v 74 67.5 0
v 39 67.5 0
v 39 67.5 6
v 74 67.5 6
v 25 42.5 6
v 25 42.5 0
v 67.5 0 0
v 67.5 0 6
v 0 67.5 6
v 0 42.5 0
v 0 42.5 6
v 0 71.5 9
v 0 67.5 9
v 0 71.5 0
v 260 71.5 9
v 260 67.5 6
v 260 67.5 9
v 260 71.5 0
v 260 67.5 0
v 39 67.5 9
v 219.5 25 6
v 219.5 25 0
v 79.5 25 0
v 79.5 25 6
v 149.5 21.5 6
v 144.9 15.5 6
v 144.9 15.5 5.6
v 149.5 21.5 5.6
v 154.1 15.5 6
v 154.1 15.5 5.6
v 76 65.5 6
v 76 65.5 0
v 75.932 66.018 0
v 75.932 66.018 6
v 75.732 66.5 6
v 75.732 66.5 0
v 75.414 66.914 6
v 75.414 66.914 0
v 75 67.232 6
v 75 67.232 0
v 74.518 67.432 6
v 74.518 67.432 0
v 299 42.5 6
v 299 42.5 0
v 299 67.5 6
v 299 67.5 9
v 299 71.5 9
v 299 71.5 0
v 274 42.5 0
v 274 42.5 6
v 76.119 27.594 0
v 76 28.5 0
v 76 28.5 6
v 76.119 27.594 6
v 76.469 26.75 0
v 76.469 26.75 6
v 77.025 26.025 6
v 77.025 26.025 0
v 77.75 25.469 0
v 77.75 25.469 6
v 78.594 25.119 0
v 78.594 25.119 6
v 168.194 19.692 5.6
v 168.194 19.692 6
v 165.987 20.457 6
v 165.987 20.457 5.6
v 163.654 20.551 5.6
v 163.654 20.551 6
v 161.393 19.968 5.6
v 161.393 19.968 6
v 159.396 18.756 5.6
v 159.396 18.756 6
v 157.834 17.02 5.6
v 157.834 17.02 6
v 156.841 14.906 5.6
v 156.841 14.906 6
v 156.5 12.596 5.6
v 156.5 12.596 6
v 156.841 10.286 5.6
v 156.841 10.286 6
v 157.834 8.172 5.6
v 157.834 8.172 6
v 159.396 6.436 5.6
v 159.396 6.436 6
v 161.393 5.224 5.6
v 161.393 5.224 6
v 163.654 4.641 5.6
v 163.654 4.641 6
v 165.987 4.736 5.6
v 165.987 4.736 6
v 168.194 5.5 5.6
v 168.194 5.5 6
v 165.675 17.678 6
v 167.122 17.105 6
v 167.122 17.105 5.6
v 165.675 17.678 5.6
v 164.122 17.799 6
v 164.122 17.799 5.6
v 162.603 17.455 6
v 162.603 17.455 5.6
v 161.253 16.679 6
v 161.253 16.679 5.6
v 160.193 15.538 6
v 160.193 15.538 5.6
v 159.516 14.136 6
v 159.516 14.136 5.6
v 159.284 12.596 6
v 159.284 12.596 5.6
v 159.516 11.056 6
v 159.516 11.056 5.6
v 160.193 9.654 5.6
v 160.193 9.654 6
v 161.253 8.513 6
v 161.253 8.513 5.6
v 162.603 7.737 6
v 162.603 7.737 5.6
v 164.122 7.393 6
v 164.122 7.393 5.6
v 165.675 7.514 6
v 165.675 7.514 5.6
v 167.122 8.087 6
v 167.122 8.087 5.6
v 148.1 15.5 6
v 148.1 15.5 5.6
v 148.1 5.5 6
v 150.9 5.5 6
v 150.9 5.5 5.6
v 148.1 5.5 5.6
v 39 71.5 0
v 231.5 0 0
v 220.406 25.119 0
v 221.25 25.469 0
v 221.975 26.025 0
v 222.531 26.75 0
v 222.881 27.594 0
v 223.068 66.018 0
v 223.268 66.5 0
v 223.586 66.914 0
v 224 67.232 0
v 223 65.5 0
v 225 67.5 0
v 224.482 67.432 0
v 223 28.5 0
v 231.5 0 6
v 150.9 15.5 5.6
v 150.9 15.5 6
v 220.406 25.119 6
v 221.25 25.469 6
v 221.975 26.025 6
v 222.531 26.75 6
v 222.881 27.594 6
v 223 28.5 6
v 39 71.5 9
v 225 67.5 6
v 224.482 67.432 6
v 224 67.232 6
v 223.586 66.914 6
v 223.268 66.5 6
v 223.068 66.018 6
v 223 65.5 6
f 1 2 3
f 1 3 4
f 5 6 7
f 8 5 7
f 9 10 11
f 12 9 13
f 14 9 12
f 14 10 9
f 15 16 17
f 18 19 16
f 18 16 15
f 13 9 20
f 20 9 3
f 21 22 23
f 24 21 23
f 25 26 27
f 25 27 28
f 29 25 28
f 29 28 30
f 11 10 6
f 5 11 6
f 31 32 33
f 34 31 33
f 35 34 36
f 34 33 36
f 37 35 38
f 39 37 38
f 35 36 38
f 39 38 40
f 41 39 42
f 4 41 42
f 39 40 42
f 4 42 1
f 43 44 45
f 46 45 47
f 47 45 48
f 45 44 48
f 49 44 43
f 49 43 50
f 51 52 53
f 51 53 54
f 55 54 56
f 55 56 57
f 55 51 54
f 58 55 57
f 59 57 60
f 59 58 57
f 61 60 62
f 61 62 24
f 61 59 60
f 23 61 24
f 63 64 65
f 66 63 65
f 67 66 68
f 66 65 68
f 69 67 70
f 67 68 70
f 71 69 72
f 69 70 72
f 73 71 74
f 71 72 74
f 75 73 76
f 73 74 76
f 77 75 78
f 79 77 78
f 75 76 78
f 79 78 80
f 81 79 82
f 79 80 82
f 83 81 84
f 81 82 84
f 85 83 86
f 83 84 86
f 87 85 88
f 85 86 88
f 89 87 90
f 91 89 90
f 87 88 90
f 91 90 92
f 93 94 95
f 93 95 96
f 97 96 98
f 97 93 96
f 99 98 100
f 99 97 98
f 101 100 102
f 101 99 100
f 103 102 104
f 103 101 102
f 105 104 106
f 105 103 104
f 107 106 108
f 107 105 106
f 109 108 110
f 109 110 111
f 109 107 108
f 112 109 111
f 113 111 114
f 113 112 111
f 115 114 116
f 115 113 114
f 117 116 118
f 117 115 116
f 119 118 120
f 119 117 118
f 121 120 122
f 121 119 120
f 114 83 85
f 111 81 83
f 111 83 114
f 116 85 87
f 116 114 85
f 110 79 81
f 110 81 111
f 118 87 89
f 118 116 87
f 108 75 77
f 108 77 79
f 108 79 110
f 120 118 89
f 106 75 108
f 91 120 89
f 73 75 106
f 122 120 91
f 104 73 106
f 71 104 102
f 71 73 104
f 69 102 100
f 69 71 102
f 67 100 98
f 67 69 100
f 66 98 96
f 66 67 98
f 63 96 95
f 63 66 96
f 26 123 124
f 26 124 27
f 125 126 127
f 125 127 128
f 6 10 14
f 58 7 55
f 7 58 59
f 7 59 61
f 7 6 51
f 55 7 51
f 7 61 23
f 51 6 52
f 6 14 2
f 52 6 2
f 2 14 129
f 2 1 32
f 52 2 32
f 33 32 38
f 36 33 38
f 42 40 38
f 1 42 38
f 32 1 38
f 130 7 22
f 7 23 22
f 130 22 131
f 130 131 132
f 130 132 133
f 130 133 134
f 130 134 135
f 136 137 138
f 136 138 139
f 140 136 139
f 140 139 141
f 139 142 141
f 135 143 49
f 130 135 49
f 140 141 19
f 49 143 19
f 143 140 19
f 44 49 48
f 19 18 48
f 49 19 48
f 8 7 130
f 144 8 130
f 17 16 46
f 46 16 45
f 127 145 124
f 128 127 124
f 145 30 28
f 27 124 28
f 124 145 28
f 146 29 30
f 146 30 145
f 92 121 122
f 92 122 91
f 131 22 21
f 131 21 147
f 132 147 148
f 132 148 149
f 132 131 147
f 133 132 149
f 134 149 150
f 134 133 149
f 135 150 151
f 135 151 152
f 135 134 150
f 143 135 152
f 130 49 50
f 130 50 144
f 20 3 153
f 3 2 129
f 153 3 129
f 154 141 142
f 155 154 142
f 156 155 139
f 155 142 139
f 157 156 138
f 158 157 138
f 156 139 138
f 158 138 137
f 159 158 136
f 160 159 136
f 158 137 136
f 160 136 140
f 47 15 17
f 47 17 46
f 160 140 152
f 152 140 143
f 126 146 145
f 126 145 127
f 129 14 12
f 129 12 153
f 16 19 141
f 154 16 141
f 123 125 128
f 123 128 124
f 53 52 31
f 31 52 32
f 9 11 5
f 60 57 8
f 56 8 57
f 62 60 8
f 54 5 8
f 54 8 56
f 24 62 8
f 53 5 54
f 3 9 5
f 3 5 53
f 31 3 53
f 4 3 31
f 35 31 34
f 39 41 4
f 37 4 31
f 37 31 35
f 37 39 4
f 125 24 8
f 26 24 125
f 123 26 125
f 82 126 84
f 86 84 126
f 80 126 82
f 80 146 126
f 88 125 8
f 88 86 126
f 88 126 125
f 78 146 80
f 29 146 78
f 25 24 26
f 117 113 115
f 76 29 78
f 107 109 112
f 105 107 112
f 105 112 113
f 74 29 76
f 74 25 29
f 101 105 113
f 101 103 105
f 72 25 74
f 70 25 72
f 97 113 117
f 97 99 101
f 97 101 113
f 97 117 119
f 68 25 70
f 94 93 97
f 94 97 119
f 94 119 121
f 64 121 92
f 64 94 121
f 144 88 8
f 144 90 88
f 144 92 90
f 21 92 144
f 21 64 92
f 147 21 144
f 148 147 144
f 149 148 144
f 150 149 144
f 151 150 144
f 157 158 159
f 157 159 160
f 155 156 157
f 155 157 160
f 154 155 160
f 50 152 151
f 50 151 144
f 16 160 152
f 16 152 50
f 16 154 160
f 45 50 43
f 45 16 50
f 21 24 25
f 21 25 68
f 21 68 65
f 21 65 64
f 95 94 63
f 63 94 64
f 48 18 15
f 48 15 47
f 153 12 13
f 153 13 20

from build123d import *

# Parameters (mm, degrees)
PAD_DEPTH    = 6
SKETCH002_W  = 39
SKETCH002_H  = 4
PAD001_DEPTH = 9
POCKET_DEPTH = 0.4


with BuildPart() as part:
    # Sketch001 → Pad (new body)
    with BuildSketch(Plane.XY):
        with BuildLine():
            Line((67.5, 0), (231.5, 0))
            Line((274, 42.5), (231.5, 0))
            Line((299, 42.5), (274, 42.5))
            Line((299, 42.5), (299, 67.5))
            Line((299, 67.5), (225, 67.5))
            ThreePointArc((225, 67.5), (223.585786, 66.914214), (223, 65.5))
            Line((223, 65.5), (223, 28.5))
            ThreePointArc((219.5, 25), (221.974874, 26.025126), (223, 28.5))
            Line((219.5, 25), (79.5, 25))
            ThreePointArc((76, 28.5), (77.025126, 26.025126), (79.5, 25))
            Line((76, 28.5), (76, 65.5))
            ThreePointArc((76, 65.5), (75.414214, 66.914214), (74, 67.5))
            Line((0, 67.5), (74, 67.5))
            Line((0, 67.5), (0, 42.5))
            Line((0, 42.5), (25, 42.5))
            Line((25, 42.5), (67.5, 0))
        make_face()
    extrude(amount=PAD_DEPTH)

    # Sketch002 → Pad001 (join)
    with BuildSketch(Plane.XY):
        with Locations((19.5, 69.5)):
            Rectangle(SKETCH002_W, SKETCH002_H)
        with Locations((279.5, 69.5)):
            Rectangle(SKETCH002_W, SKETCH002_H)
    extrude(amount=PAD001_DEPTH)

    # Sketch (on Face4 of Pad001) → Pocket (cut)
    with BuildSketch(Plane.XY.offset(6)):
        Polygon((144.9, 15.5), (149.5, 21.5), (154.1, 15.5), (150.9, 15.5), (150.9, 5.5), (148.1, 5.5), (148.1, 15.5), align=None)
        with BuildLine():
            ThreePointArc((168.193989, 19.692173), (156.5, 12.596087), (168.193989, 5.5))
            Line((167.122475, 8.086863), (168.193989, 5.5))
            ThreePointArc((167.122475, 17.105311), (159.283634, 12.596087), (167.122475, 8.086863))
            Line((167.122475, 17.105311), (168.193989, 19.692173))
        make_face()
    extrude(amount=-POCKET_DEPTH, mode=Mode.SUBTRACT)


solid = part.part
